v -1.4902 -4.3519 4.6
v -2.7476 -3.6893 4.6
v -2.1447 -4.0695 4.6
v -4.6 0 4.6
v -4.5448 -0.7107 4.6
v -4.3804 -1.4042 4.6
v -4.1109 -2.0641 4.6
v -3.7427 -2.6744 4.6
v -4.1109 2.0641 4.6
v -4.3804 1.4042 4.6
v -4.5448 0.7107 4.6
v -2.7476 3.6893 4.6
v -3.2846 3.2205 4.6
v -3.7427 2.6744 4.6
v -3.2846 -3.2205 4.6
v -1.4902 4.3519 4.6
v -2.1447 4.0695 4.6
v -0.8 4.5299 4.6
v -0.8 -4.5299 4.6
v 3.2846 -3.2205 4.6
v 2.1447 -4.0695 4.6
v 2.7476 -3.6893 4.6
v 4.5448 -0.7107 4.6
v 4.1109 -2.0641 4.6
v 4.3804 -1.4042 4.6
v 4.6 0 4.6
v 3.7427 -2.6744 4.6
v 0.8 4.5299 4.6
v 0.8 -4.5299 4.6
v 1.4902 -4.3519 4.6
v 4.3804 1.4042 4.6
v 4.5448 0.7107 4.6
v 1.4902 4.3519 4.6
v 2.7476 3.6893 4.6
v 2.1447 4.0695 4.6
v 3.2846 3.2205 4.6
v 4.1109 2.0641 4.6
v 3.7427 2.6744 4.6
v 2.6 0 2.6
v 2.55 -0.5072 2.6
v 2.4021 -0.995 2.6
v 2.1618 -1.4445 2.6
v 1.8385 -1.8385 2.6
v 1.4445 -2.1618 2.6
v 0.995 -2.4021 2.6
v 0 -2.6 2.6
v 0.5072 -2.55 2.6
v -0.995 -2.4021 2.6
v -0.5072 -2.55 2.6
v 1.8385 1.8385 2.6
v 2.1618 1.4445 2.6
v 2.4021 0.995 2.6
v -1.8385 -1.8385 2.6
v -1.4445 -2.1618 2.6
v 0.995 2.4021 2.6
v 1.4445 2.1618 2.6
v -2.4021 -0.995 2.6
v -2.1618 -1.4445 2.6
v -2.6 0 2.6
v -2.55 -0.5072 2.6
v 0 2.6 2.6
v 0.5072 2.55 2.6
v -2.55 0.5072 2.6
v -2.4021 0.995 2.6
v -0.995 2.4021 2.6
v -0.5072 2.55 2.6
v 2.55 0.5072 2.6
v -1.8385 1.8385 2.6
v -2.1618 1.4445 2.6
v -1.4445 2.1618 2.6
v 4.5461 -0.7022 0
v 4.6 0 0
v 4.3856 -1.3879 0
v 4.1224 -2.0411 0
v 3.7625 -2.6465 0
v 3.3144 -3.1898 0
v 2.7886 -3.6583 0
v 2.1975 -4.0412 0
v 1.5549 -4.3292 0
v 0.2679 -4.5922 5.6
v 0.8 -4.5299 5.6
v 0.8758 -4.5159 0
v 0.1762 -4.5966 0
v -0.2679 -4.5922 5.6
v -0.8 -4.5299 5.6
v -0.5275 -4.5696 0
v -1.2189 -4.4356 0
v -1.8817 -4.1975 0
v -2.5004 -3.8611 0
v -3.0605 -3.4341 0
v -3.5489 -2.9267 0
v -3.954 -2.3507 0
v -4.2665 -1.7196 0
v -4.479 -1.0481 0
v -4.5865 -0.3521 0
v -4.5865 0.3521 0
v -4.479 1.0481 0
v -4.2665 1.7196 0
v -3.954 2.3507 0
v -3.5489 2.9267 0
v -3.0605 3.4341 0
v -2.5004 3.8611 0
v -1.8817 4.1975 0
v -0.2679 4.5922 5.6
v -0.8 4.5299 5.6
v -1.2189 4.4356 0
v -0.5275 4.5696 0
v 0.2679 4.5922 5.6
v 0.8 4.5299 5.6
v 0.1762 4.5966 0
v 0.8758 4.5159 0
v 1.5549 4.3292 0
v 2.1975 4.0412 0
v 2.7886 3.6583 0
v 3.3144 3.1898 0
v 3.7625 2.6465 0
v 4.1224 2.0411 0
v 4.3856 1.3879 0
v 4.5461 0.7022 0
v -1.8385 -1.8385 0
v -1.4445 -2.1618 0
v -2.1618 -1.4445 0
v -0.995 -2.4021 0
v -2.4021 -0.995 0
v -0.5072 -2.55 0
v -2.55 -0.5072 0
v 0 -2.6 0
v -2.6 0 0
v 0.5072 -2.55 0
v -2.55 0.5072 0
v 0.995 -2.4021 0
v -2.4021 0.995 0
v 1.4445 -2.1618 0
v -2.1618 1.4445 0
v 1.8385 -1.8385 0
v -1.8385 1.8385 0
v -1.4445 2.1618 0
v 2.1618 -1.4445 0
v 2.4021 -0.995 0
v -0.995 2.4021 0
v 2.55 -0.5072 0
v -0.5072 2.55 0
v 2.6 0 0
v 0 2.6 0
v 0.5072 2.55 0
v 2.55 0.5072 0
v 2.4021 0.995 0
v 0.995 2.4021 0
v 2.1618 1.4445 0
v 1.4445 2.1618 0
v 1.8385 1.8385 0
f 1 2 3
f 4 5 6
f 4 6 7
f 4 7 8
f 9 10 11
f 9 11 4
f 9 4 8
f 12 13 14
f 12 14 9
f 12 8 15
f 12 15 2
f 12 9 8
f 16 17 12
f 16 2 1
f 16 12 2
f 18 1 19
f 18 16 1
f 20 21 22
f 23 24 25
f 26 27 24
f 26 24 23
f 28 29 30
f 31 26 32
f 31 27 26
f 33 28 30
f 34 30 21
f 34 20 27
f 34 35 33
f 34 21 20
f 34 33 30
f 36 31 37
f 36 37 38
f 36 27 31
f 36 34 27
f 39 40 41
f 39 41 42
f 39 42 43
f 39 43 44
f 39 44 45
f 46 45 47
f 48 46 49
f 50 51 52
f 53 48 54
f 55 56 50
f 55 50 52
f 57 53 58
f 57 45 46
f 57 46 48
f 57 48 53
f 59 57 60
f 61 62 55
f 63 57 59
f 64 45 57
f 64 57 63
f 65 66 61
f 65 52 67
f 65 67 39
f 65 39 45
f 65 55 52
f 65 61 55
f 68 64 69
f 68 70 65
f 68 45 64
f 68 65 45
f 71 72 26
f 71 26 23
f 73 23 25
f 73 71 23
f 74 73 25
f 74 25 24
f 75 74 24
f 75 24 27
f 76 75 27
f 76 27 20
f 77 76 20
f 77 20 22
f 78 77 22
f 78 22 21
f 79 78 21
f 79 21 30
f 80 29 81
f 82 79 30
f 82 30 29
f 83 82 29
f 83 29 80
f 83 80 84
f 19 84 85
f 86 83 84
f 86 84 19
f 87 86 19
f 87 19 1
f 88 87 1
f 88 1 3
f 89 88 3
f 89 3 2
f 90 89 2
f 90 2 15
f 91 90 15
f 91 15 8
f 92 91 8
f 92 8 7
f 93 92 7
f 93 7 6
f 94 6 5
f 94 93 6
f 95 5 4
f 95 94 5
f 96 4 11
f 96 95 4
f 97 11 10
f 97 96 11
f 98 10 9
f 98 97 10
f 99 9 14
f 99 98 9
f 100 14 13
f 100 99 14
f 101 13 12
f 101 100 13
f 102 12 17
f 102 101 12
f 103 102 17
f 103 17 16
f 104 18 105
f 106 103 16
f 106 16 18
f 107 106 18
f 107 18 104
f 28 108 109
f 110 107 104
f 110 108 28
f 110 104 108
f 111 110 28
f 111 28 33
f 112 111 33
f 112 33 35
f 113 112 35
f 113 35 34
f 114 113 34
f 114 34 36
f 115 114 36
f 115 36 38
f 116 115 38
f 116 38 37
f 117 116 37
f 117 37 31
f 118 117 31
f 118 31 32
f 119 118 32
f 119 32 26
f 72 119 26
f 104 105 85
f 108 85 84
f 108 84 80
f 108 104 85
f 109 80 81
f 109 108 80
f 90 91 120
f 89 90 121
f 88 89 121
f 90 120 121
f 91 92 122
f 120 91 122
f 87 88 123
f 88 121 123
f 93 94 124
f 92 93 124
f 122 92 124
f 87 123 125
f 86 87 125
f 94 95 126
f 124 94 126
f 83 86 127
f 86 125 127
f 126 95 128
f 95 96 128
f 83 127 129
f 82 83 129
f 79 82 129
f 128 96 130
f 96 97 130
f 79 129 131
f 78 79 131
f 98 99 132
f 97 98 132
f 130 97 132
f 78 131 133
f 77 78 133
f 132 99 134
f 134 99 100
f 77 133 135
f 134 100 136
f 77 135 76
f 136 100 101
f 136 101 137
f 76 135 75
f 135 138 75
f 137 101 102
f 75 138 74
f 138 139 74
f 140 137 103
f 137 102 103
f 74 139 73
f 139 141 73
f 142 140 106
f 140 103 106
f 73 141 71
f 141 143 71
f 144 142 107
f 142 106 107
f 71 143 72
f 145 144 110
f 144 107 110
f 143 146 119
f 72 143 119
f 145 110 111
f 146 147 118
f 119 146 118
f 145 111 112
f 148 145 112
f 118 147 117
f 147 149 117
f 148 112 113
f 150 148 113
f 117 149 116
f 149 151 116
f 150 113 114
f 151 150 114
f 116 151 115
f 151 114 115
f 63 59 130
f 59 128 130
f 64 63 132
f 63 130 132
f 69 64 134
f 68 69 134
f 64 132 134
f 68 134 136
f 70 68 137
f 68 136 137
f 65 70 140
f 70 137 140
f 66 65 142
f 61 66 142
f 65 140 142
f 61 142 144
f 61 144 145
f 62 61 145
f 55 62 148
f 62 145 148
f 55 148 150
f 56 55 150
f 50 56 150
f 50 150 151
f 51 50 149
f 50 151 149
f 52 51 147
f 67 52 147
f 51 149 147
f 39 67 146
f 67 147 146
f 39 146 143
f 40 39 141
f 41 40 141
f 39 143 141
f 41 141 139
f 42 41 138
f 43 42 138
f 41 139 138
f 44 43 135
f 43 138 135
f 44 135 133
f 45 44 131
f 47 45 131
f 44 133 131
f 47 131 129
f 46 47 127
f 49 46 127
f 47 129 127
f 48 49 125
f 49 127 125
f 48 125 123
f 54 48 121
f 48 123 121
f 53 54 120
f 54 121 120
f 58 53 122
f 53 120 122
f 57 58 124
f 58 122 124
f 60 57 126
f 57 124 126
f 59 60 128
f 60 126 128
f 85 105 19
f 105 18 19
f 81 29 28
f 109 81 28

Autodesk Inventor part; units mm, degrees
ref_plane "YZ Plane" through (0, 0, 0) normal (1, 0, 0) x (0, 1, 0)
ref_plane "XZ Plane" through (0, 0, 0) normal (0, 1, 0) x (-1, 0, 0)
ref_plane "XY Plane" through (0, 0, 0) normal (0, 0, 1) x (1, 0, 0)
sketch "Sketch1" plane through (0, 0, 0) normal (0, 0, 1) x (1, 0, 0)
  circle A0 centre (0, 0) radius 4.6
  dimension "d0" = 9.2
extrude "Extrusion1" add sketch "Sketch1" along normal blind 4.6
sketch "Sketch2" plane through (0, 0, 0) normal (0, 0, -1) x (-1, 0, 0)
  circle A0 centre (0, 0) radius 2.6
  dimension "d3" = 5.2
extrude "Extrusion2" cut sketch "Sketch2" against normal blind 2.6
sketch "Sketch4" plane through (0, 0, 4.6) normal (0, 0, 1) x (1, 0, 0)
  line L0 (0.8, 6.5) -> (-0.8, 6.5)
  line L1 (-0.8, 6.5) -> (-0.8, -6.5)
  line L2 (-0.8, -6.5) -> (0.8, -6.5)
  line L3 (0.8, -6.5) -> (0.8, 6.5)
  line L4 (0.8, 6.5) -> (-0.8, -6.5) construction
  line L5 (-0.8, 6.5) -> (0.8, -6.5) construction
  circle A0 centre (0, 0) radius 4.6
  circle A1 centre (0, 0) radius 4.6 projected
  point P0 (0.8, 4.5299)
  point P1 (-0.8, 4.5299)
  point P2 (-0.8, -4.5299)
  point P3 (0.8, -4.5299)
  dimension "d14" = 1.6
  dimension "d15" = 13
extrude "Extrusion4" add sketch "Sketch4" along normal blind 1 contours L3 A0 L1
properties part number "RamaKola"
